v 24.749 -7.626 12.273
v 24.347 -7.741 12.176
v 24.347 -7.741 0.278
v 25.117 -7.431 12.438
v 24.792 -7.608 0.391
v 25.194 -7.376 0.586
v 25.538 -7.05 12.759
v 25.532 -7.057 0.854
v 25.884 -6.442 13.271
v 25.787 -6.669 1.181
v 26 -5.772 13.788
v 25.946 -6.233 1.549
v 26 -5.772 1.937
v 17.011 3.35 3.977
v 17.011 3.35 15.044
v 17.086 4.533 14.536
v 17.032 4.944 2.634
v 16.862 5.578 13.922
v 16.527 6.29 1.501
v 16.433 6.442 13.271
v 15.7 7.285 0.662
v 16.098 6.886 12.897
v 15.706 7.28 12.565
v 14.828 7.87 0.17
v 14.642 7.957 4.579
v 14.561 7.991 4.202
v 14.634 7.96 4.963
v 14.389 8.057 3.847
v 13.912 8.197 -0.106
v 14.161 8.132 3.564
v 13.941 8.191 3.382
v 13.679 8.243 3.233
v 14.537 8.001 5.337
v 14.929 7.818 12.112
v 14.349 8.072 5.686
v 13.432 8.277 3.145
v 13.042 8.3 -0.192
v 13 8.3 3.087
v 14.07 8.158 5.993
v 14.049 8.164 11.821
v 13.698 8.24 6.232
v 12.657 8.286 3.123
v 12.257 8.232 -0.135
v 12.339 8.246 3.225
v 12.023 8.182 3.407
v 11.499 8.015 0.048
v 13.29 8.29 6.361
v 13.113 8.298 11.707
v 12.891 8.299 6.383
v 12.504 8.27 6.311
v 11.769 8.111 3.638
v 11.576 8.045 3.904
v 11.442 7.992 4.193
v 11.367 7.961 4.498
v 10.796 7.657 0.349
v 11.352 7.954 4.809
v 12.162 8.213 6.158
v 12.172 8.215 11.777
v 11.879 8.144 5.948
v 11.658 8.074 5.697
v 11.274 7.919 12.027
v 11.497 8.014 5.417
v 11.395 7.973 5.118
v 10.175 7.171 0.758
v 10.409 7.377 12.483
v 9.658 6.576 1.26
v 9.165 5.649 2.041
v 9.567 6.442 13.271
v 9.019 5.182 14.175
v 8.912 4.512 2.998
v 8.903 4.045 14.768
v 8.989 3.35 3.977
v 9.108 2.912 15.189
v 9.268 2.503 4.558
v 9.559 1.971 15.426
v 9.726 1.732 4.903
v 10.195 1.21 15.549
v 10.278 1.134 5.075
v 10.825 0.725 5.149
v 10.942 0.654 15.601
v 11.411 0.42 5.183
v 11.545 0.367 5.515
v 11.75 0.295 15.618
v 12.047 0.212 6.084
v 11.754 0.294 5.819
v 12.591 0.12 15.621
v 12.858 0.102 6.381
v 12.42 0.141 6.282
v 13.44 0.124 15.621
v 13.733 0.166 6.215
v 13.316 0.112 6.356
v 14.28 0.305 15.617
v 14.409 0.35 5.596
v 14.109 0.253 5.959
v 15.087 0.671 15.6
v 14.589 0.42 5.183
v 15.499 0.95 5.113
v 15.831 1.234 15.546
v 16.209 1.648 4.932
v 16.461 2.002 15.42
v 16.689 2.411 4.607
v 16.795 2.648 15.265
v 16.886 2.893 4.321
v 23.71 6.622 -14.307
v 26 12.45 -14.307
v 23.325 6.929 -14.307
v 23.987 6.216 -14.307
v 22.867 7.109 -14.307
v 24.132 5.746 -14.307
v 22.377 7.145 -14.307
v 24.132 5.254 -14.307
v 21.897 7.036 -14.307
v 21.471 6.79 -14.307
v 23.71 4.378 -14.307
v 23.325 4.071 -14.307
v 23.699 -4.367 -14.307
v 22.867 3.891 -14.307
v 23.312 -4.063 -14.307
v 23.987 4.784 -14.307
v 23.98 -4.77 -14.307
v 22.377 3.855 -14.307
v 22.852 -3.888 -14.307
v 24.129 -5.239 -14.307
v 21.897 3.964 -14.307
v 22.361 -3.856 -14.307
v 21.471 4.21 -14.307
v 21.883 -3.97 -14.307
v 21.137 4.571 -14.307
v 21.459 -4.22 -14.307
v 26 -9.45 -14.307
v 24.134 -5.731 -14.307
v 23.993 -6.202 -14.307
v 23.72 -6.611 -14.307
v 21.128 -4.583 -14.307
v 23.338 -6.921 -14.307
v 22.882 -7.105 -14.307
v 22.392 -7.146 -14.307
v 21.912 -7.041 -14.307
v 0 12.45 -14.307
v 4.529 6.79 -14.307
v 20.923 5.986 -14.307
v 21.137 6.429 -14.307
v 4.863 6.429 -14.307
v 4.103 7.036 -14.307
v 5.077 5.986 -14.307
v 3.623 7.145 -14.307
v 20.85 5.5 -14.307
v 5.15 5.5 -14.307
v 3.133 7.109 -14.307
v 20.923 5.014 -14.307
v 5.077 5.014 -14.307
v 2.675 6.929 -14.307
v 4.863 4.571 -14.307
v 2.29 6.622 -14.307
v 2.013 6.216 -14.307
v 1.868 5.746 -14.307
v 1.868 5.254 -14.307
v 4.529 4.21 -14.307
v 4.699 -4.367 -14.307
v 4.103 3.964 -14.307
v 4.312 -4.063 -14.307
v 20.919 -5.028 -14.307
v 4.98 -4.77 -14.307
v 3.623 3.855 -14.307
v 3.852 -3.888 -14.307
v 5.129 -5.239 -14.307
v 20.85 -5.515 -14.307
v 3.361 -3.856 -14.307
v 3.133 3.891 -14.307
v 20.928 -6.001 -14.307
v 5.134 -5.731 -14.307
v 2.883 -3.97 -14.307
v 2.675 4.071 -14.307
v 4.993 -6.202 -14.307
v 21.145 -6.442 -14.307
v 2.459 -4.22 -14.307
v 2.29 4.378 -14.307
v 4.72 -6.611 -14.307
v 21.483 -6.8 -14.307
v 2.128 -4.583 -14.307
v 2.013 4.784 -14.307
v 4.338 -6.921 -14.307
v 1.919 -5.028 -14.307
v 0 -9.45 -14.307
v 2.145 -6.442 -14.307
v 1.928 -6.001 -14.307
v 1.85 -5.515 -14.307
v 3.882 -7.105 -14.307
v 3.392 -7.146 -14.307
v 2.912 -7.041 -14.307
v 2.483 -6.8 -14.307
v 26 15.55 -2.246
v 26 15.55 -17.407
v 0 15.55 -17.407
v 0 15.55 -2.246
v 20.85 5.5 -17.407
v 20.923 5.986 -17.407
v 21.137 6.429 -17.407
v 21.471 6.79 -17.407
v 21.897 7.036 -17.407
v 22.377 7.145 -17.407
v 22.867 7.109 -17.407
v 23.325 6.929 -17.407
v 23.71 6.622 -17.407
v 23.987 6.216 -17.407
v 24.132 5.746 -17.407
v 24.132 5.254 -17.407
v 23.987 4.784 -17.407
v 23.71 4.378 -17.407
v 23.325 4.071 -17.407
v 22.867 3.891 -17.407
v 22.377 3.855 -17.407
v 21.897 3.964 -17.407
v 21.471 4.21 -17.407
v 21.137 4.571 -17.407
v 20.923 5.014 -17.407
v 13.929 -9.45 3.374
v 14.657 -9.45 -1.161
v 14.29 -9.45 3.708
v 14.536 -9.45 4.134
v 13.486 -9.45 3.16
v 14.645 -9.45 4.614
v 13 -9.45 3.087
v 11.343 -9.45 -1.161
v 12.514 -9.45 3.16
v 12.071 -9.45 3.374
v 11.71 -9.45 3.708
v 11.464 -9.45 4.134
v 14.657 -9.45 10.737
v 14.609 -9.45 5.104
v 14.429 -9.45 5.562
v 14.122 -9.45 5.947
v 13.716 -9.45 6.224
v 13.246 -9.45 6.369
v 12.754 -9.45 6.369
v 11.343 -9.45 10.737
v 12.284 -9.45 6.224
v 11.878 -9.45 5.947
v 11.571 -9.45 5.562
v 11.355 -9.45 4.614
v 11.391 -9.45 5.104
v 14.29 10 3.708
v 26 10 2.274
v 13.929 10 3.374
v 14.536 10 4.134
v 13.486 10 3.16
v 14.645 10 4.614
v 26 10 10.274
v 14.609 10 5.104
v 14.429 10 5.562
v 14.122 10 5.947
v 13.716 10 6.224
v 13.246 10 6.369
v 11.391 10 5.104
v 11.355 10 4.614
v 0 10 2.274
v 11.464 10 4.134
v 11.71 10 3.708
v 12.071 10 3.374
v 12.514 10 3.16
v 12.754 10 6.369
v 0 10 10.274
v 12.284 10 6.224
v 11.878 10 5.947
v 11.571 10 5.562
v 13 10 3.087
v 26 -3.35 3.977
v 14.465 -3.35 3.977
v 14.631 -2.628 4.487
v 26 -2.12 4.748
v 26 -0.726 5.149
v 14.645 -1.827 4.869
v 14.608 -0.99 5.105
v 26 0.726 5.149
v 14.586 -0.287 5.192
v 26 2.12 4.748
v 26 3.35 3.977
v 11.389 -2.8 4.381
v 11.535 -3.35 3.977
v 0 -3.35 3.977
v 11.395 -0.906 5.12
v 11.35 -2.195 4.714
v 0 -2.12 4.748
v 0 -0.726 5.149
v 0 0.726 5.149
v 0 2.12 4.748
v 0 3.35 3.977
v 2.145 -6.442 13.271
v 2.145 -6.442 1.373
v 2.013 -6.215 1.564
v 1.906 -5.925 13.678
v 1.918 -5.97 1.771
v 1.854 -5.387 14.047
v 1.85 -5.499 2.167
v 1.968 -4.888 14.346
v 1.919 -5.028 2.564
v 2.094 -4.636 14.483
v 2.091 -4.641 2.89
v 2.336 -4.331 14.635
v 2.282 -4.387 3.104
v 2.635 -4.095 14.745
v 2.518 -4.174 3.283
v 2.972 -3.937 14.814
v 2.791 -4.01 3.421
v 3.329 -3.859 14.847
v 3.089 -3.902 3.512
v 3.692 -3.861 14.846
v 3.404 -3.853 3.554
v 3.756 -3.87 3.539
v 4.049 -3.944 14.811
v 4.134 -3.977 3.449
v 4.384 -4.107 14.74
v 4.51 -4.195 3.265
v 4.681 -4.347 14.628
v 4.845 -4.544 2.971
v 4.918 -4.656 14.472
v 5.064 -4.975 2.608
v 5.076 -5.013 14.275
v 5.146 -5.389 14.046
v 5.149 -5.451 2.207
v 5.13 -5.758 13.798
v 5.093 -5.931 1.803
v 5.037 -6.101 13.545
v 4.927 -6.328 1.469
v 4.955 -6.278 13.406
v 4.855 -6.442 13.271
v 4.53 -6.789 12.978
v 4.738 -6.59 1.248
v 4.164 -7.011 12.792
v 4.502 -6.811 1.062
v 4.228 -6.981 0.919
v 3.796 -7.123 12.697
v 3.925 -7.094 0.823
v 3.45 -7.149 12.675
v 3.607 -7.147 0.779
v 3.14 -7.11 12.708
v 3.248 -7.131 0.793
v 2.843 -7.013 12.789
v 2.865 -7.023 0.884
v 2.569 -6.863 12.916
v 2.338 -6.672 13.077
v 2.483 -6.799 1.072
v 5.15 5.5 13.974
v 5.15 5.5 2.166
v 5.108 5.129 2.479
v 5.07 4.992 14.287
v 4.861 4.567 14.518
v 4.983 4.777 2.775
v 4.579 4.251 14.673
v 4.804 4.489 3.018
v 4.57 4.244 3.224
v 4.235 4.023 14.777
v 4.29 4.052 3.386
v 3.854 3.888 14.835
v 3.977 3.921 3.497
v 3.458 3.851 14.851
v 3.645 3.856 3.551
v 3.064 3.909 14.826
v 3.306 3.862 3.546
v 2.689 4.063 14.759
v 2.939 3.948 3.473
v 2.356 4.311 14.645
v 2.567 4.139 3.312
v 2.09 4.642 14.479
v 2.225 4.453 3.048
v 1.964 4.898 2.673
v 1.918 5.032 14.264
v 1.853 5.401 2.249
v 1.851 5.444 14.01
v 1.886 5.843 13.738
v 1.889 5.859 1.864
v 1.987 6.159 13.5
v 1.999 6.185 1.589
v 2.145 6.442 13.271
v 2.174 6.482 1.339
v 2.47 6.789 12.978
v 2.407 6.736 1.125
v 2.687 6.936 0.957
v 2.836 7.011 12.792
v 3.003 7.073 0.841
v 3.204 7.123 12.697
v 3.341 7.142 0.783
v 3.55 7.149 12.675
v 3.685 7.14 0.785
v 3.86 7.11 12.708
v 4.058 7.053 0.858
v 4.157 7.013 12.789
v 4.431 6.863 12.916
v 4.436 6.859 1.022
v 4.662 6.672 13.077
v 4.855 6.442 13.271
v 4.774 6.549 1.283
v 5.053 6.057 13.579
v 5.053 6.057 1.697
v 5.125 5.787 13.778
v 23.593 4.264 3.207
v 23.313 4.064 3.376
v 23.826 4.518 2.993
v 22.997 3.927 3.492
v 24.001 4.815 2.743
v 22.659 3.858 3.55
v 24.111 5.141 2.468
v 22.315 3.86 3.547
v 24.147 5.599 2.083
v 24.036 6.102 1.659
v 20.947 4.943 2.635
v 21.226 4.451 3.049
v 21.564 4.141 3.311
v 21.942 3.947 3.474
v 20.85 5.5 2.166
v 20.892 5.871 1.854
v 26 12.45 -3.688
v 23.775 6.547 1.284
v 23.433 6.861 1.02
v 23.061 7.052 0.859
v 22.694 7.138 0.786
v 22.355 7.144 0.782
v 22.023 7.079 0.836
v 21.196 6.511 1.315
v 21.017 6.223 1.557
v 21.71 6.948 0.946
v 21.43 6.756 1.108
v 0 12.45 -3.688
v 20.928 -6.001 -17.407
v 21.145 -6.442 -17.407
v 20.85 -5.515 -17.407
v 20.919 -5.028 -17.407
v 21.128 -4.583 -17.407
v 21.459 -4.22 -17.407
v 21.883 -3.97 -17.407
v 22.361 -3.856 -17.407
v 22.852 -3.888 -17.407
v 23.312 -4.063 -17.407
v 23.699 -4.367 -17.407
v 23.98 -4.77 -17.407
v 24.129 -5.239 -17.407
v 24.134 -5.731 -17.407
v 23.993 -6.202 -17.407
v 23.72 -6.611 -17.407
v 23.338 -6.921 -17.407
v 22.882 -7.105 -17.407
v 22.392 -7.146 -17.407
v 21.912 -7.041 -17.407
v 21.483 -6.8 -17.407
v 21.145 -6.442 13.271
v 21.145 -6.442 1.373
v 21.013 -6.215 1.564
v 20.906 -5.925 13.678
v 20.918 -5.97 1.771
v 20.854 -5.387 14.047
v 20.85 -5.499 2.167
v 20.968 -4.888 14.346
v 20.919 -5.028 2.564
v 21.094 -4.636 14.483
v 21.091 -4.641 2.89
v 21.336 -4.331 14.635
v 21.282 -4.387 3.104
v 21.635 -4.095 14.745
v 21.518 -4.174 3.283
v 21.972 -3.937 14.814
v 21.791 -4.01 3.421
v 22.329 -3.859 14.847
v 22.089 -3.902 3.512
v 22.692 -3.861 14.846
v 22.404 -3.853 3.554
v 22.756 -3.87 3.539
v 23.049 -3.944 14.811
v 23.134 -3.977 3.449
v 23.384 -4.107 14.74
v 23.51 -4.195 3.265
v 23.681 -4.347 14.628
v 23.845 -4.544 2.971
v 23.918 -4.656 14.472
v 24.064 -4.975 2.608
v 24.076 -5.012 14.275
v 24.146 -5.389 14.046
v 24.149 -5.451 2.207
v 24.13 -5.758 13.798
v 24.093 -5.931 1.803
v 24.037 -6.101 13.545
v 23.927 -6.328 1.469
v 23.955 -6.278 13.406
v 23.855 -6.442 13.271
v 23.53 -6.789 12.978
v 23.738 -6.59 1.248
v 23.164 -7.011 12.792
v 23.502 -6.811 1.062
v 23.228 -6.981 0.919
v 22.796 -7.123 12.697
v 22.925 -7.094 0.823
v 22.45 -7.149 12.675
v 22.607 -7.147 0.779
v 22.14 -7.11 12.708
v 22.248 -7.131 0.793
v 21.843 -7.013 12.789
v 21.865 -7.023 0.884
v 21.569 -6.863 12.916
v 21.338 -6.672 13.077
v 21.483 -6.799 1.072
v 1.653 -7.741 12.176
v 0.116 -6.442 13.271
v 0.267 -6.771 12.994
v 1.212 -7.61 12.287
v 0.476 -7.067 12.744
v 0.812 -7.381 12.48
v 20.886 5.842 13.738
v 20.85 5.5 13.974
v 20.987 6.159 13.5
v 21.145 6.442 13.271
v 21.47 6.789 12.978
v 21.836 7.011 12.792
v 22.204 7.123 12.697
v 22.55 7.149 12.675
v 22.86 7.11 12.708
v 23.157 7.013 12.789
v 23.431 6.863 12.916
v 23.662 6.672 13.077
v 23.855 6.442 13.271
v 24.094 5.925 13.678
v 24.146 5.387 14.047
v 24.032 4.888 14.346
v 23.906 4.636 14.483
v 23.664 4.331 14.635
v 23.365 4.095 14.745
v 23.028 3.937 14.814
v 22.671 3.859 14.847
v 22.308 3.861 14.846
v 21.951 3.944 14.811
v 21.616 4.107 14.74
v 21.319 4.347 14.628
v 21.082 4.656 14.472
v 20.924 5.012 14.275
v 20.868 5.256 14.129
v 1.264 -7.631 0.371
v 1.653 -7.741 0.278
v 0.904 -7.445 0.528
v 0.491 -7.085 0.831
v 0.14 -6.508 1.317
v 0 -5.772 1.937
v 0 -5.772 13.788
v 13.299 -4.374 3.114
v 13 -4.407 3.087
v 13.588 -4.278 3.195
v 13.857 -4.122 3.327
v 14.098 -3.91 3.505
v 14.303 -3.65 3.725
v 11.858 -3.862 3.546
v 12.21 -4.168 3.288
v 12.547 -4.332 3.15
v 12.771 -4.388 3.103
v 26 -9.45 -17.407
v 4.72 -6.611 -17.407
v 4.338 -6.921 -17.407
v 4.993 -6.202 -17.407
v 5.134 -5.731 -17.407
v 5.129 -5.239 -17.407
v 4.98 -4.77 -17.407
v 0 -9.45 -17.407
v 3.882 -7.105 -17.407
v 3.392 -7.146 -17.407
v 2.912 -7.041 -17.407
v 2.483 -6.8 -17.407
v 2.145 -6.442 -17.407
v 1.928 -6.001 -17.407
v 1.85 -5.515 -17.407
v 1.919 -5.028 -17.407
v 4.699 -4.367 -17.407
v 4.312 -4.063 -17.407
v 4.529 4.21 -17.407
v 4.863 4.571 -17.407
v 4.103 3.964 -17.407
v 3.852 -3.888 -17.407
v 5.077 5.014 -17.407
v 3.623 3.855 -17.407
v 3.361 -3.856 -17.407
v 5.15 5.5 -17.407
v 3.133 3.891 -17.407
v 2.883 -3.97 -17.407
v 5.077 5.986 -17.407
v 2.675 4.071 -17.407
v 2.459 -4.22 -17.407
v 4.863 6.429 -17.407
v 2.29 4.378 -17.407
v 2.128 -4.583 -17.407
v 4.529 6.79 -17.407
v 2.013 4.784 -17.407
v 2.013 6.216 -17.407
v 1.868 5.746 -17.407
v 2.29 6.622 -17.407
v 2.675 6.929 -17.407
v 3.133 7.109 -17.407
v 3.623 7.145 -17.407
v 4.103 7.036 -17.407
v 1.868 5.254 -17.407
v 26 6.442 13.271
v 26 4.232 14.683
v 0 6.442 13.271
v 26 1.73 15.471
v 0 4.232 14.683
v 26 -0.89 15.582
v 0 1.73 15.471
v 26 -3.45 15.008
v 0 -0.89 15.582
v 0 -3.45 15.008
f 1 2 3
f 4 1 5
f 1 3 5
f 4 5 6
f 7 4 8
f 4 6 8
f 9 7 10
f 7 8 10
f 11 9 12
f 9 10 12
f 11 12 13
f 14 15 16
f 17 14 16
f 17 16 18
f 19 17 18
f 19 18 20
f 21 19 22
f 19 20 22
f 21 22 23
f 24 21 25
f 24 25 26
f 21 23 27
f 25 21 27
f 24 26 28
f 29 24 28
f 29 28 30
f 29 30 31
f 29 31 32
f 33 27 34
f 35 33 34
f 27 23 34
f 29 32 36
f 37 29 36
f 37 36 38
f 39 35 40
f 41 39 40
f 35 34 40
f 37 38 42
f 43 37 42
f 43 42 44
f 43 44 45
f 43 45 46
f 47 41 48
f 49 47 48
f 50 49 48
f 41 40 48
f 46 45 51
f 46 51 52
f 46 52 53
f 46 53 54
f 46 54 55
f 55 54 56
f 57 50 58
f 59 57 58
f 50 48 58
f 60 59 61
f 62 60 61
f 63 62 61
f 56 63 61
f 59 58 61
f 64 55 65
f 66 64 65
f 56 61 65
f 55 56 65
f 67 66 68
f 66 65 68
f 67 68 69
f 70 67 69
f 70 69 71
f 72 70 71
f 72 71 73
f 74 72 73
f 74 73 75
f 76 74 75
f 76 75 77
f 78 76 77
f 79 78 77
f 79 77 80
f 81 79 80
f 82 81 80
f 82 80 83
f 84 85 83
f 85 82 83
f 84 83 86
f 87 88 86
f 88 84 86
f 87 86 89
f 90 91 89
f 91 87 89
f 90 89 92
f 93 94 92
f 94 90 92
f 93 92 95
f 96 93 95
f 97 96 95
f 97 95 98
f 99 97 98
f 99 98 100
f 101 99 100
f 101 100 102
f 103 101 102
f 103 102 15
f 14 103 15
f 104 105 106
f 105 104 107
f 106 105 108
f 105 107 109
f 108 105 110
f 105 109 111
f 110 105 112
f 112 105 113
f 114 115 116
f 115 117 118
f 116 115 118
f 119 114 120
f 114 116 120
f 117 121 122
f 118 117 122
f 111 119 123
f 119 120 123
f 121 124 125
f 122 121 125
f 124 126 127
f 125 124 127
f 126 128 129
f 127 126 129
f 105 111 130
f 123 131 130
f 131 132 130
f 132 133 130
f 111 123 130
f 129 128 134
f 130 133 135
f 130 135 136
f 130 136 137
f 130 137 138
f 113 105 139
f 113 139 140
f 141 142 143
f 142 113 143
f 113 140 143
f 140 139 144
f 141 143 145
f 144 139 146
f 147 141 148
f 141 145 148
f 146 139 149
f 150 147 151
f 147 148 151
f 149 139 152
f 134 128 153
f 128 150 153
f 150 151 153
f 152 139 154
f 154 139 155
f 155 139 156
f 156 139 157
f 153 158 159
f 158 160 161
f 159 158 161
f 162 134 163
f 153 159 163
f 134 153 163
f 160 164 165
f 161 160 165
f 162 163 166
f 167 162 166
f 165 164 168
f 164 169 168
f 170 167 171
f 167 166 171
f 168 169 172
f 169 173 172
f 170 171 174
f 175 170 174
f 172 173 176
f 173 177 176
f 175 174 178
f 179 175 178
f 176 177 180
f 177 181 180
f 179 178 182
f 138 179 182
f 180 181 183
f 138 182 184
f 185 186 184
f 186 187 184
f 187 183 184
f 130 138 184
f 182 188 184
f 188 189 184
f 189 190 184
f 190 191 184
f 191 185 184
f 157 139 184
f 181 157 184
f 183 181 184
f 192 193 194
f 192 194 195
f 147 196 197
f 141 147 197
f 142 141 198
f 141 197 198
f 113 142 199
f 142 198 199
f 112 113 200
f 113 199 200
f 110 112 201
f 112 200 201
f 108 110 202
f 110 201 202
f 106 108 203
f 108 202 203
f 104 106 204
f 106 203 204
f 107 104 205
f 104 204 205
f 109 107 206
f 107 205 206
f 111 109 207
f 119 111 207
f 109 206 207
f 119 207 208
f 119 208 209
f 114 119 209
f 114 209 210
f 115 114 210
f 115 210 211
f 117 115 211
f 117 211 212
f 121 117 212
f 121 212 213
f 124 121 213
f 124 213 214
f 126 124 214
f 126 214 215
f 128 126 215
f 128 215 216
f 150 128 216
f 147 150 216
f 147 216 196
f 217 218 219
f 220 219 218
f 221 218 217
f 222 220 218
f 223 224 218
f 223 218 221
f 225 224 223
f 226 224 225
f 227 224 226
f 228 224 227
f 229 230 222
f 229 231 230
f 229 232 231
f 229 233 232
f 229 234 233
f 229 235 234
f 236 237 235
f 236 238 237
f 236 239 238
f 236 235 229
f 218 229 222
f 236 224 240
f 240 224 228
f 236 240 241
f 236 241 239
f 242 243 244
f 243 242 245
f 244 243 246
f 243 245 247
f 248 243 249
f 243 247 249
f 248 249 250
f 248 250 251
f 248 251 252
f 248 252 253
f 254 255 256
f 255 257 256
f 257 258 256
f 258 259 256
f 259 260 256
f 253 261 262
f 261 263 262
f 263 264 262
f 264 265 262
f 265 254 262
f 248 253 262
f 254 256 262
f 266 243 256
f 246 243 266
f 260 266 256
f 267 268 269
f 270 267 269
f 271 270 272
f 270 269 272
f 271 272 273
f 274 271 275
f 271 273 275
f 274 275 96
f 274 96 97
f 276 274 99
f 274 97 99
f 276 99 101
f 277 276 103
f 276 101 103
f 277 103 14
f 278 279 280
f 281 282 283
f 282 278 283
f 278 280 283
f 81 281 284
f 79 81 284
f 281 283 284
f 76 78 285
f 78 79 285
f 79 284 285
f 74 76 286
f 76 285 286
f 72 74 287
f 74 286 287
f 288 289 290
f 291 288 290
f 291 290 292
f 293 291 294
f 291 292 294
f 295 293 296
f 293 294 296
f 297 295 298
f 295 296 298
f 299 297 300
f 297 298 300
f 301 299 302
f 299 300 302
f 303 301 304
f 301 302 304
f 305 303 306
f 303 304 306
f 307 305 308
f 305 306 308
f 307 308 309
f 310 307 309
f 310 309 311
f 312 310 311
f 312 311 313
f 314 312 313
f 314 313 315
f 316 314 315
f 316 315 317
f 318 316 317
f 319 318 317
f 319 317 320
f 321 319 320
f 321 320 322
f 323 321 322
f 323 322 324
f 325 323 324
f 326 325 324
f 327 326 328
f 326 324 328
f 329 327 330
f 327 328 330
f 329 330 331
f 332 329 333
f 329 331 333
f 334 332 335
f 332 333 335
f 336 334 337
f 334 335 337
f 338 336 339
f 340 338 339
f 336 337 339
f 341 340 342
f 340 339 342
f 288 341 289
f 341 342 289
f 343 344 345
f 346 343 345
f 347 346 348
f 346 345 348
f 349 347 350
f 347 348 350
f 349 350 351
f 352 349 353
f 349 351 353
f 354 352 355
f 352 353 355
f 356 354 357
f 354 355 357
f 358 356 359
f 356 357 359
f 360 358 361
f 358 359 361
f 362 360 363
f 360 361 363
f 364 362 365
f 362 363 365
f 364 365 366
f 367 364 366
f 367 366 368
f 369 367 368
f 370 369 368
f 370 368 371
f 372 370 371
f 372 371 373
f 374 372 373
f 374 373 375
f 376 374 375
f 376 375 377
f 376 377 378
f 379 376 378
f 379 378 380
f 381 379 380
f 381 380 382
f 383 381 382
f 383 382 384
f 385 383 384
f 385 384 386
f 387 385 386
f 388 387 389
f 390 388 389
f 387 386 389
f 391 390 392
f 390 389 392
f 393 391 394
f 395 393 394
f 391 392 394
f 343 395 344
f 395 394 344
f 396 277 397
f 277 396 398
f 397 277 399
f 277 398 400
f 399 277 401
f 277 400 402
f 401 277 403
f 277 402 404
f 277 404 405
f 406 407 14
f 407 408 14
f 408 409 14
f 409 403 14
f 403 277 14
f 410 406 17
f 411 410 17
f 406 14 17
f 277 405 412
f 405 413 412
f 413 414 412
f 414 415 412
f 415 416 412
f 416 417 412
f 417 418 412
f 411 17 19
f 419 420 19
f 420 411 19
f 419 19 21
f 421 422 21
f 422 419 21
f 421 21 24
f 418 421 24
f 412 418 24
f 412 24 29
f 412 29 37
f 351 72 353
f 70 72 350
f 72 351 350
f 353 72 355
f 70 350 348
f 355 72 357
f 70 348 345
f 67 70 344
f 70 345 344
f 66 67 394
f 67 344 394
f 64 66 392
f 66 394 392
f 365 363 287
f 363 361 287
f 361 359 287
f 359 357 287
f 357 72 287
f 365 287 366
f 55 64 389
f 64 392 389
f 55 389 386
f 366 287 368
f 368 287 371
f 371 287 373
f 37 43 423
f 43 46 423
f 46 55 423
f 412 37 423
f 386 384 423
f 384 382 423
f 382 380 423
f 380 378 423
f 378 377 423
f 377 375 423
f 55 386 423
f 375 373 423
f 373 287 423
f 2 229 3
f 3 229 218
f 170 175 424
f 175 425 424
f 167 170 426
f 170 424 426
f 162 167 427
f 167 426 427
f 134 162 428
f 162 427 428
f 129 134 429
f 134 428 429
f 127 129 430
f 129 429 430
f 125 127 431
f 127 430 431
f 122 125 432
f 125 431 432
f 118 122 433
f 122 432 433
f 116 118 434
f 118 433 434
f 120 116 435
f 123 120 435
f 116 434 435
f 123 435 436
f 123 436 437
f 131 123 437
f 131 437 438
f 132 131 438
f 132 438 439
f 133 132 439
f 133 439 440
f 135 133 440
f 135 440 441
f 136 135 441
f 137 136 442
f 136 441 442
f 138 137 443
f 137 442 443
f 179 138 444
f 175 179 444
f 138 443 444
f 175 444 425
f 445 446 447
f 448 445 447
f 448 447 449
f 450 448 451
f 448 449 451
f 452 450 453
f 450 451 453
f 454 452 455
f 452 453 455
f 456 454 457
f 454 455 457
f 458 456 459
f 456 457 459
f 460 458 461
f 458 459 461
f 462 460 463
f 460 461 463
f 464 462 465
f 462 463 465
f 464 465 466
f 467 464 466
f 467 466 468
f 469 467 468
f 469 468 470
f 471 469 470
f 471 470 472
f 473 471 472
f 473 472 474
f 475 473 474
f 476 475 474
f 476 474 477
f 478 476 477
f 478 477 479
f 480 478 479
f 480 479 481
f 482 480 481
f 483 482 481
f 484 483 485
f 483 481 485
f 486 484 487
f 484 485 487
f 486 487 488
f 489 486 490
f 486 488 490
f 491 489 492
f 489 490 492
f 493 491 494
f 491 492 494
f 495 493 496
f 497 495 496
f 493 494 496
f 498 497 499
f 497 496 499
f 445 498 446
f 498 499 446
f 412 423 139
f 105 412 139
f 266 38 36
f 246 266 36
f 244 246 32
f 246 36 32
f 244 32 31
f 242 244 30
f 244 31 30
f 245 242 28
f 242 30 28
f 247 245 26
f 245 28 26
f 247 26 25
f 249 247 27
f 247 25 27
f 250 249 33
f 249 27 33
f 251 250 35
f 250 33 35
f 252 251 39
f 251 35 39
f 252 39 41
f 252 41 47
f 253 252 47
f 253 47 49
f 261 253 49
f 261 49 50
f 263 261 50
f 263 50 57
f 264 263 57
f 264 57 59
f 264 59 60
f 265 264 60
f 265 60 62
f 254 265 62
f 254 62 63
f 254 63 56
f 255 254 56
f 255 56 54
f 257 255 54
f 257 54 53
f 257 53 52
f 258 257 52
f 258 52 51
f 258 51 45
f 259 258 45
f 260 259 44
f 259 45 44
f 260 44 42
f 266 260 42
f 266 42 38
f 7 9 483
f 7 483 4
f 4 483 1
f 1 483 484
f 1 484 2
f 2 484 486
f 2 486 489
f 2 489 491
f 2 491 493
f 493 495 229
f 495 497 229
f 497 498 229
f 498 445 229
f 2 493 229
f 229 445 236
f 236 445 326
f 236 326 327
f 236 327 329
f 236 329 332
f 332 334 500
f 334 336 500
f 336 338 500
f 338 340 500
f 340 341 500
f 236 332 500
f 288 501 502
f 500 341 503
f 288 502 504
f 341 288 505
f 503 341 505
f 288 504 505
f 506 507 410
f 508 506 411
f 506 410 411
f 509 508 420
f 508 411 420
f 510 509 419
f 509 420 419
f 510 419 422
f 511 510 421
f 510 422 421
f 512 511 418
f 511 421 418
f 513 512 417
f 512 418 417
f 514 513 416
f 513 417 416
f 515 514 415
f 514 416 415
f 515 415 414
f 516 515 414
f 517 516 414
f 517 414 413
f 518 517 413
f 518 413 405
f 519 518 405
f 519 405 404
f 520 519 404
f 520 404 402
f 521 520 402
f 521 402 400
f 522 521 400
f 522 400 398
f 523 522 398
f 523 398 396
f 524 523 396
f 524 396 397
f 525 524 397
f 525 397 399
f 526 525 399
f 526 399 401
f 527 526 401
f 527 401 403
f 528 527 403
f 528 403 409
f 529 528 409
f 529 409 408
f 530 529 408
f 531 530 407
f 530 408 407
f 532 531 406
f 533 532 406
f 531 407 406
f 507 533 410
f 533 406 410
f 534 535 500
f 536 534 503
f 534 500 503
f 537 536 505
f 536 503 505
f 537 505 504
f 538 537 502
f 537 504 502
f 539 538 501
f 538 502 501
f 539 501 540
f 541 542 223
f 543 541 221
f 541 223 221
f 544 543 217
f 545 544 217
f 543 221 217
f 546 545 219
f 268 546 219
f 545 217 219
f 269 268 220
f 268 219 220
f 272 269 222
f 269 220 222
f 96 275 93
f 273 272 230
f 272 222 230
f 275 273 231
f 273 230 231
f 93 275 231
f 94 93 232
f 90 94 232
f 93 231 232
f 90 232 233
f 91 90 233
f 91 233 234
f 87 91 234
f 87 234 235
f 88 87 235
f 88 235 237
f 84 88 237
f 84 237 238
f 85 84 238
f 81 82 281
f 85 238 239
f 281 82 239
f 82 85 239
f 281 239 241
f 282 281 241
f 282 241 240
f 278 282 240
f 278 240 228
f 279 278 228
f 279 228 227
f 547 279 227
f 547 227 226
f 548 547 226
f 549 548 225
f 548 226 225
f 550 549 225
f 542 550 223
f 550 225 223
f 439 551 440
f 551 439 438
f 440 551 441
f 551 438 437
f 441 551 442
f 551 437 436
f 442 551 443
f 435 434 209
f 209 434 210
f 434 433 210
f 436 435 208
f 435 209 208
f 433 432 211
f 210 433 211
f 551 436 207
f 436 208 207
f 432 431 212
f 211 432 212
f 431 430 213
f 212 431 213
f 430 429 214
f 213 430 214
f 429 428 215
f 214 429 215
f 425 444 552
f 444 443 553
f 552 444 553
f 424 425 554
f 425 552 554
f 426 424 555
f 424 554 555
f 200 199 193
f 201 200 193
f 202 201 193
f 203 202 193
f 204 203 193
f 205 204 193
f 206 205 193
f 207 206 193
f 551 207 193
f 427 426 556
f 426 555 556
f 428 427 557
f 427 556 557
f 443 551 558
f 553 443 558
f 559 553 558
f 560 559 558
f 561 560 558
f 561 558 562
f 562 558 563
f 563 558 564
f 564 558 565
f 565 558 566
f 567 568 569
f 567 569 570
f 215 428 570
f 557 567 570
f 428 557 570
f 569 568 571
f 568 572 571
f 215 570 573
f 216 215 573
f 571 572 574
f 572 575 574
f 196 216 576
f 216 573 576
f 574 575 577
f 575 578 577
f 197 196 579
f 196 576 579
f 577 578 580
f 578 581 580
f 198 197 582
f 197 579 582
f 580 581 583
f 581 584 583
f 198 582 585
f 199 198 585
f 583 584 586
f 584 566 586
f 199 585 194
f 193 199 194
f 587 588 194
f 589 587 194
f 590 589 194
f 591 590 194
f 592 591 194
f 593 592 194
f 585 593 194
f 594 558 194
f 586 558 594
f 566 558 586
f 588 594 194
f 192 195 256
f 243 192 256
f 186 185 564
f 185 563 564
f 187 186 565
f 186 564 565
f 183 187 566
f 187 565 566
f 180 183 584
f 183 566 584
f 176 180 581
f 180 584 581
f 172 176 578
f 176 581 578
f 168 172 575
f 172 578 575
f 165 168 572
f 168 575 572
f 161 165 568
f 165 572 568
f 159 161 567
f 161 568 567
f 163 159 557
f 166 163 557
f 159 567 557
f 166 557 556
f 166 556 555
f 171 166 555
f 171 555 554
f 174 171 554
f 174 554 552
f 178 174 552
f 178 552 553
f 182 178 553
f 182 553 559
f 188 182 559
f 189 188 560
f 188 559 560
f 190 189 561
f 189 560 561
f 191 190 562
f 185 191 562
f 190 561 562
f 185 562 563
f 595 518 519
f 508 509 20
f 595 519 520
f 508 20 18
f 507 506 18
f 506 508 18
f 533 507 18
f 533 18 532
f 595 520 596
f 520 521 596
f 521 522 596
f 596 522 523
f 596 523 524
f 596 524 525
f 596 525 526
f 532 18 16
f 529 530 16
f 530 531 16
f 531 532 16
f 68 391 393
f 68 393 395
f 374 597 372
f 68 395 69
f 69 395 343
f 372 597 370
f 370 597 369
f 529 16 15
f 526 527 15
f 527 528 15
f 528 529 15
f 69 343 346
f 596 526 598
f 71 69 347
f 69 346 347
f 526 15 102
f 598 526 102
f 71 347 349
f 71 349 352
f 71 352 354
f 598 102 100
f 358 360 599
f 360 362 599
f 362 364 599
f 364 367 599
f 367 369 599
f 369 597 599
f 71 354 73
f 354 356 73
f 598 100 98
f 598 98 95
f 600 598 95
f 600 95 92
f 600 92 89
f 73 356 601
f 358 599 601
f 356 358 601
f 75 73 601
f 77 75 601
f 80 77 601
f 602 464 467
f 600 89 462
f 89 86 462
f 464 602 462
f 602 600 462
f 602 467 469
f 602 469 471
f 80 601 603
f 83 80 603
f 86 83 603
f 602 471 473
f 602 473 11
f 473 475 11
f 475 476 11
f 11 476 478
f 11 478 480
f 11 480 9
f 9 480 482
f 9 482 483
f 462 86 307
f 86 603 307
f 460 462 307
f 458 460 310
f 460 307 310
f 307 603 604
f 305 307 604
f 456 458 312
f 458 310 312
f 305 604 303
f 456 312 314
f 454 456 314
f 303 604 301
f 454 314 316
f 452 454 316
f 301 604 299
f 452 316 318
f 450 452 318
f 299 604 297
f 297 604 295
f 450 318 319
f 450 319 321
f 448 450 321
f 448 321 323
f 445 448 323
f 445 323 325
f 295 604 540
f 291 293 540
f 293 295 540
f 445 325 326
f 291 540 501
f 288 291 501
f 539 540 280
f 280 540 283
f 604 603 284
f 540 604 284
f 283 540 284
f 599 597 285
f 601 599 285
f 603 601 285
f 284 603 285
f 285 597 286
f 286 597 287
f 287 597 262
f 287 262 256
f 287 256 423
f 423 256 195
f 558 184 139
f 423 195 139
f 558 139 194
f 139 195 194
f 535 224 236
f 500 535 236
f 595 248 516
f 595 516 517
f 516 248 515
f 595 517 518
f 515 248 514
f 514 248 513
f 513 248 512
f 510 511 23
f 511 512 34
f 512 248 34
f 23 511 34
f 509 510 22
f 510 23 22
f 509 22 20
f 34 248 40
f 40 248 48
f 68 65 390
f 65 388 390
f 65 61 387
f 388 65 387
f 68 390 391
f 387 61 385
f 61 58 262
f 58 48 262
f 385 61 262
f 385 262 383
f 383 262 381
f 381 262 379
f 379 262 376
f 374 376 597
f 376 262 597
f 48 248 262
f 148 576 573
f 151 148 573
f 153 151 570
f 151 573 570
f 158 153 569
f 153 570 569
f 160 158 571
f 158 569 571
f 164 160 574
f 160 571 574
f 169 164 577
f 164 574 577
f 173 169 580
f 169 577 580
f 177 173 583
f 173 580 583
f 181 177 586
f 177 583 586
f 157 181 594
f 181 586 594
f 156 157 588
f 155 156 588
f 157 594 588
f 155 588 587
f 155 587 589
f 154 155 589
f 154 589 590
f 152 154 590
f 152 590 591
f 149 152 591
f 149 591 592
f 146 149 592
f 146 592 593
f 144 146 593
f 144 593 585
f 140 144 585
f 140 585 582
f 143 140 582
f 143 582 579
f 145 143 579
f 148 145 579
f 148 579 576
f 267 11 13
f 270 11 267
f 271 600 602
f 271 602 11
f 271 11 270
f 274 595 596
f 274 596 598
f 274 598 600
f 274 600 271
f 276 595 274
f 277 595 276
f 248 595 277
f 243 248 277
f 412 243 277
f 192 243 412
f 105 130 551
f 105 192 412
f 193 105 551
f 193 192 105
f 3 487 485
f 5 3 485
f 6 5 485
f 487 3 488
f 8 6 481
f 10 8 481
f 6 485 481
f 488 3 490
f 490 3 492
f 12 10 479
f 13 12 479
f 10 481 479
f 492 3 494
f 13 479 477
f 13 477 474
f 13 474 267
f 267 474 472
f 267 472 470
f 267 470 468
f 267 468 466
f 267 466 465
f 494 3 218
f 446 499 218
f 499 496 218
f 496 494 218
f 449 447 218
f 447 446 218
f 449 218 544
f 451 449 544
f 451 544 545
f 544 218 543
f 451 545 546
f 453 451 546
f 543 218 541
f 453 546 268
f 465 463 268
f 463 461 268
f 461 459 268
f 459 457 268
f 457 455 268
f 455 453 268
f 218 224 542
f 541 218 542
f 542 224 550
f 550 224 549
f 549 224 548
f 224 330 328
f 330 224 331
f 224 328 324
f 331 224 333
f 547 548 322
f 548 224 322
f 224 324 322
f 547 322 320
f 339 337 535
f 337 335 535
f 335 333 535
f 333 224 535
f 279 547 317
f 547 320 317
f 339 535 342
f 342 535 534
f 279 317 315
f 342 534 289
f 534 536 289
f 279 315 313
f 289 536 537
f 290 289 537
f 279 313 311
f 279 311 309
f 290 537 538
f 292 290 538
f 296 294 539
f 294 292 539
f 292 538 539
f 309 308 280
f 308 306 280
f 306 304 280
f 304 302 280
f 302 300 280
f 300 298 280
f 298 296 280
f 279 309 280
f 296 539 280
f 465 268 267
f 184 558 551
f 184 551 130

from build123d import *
from OCP.BRepFilletAPI import BRepFilletAPI_MakeChamfer

# Parameters (mm, degrees)
EXTRUDE_1_DEPTH     = 26
SKETCH_2_R          = 1.65
CUT_EXTRUDE_1_DEPTH = 45.819078563
SKETCH_3_W          = 28.1444964
SKETCH_3_H          = 6.1
CUT_EXTRUDE_2_DEPTH = 35.940261345
CUT_EXTRUDE_4_REACH = 46.819
SKETCH_5_R          = 4.1
SKETCH_6_R          = 1.65
CUT_EXTRUDE_5_DEPTH = 41.050210522
CHAMFER_1_SIZE      = 2
CHAMFER_1_SIZE2     = 11.342563639
FILLET_1_R          = 2


with BuildPart() as part:
    # 草图1 → 凸台-拉伸1 (new body)
    with BuildSketch(Plane(origin=(0, 0, 0), x_dir=(0, 0, -1), z_dir=(1, 0, 0))):
        with BuildLine():
            Line((17.407451211, 15.55), (2.245544981, 15.55))
            Line((2.245544981, 15.55), (-2.273793452, 10))
            Line((-2.273793452, 10), (-10.273793452, 10))
            Line((-10.273793452, 10), (-13.270509165, 6.44212097))
            ThreePointArc((-13.270509165, 6.44212097), (-15.622040206, 0), (-13.270509165, -6.44212097))
            Line((-13.270509165, -6.44212097), (-10.273793452, -10))
            Line((-10.273793452, -10), (-2.273793452, -10))
            Line((-2.273793452, -10), (2.245544981, -15.55))
            Line((2.245544981, -15.55), (17.407451211, -15.55))
            Line((17.407451211, -15.55), (17.407451211, 15.55))
        make_face()
        with BuildLine():
            Line((3.687588487, 12.45), (14.307451211, 12.45))
            Line((14.307451211, 12.45), (14.307451211, -12.45))
            Line((14.307451211, -12.45), (3.687588487, -12.45))
            Line((3.687588487, -12.45), (-3.977203858, -3.349902904))
            ThreePointArc((-3.977203858, -3.349902904), (-5.2, 0), (-3.977203858, 3.349902904))
            Line((-3.977203858, 3.349902904), (3.687588487, 12.45))
        make_face(mode=Mode.SUBTRACT)
    extrude(amount=EXTRUDE_1_DEPTH)

    # 草图2 → 切除-拉伸1 (cut, through all)
    with BuildSketch(Plane(origin=(0, 0, -17.407451211), x_dir=(-1, 0, 0), z_dir=(0, 0, -1))):
        with Locations((-22.5, 5.5)):
            Circle(SKETCH_2_R)
        with Locations(Location((-22.5, -5.5, 0), (0, 0, 325.181239638))):
            Circle(SKETCH_2_R)
        with Locations(Location((-3.5, -5.5, 0), (0, 0, 325.181239638))):
            Circle(SKETCH_2_R)
        with Locations(Location((-3.5, 5.5, 0), (0, 0, 180))):
            Circle(SKETCH_2_R)
    extrude(amount=-CUT_EXTRUDE_1_DEPTH, mode=Mode.SUBTRACT)

    # 草图3 → 切除-拉伸2 (cut, through all)
    with BuildSketch(Plane.ZY):
        with Locations((-3.335203011, -12.5)):
            Rectangle(SKETCH_3_W, SKETCH_3_H)
    extrude(amount=-CUT_EXTRUDE_2_DEPTH, mode=Mode.SUBTRACT)

    # 草图5 → 切除-拉伸4 (cut, up to next)
    with BuildSketch(Plane.XY.offset(15.622040206), mode=Mode.PRIVATE) as cut_extrude_4_sk1:
        with Locations(Location((13, 4.2, 0), (0, 0, 348.033440949))):
            Circle(SKETCH_5_R)
    cut_extrude_4_tool1 = extrude(cut_extrude_4_sk1.sketch, amount=-CUT_EXTRUDE_4_REACH, mode=Mode.PRIVATE) & part.part
    add(cut_extrude_4_tool1.solids().sort_by_distance((13, 4.2, 15.62204))[0], mode=Mode.SUBTRACT)

    # 草图6 → 切除-拉伸5 (cut, through all)
    with BuildSketch(Plane.XZ.offset(9.45)):
        with Locations(Location((13, 4.737045189, 0), (0, 0, 270))):
            Circle(SKETCH_6_R)
    extrude(amount=-CUT_EXTRUDE_5_DEPTH, mode=Mode.SUBTRACT)

    # 倒角1: one chamfer whose edges measure the first distance from different faces: ONE call of the kernel's chamfer builder (chamfer() names one face for all edges)
    chamfer_1_edges_1 = [part.edges().sort_by_distance(p)[0] for p in [
        (0, -9.45, 4.78814218),
    ]]
    chamfer_1_side_1 = [part.faces().sort_by_distance(p)[0] for p in [
        (0, -9.035760057, -15.857451211),
    ]]
    chamfer_1_edges_2 = [part.edges().sort_by_distance(p)[0] for p in [
        (26, -9.45, 4.78814218),
    ]]
    chamfer_1_side_2 = [part.faces().sort_by_distance(p)[0] for p in [
        (26, -9.035760057, -15.857451211),
    ]]
    chamfer_1 = BRepFilletAPI_MakeChamfer(part.part.solid().wrapped)
    for e in chamfer_1_edges_1:
        chamfer_1.Add(CHAMFER_1_SIZE, CHAMFER_1_SIZE2, e.wrapped, chamfer_1_side_1[0].wrapped)  # the first distance lies on this face
    for e in chamfer_1_edges_2:
        chamfer_1.Add(CHAMFER_1_SIZE, CHAMFER_1_SIZE2, e.wrapped, chamfer_1_side_2[0].wrapped)  # the first distance lies on this face
    add(Compound.cast(chamfer_1.Shape()), mode=Mode.REPLACE)

    # 圆角1
    # the kernel refuses this fillet: 2 mm, written as the material it takes off along each edge
    with BuildSketch(Plane(origin=(26, -7.45, -3.671707212), x_dir=(-0.9848077530122086, -0.17364817766692747, 0), z_dir=(0, 0, 1))) as fillet_1_piece_1:
        with BuildLine():
            CenterArc((FILLET_1_R * 0.839099631177, -FILLET_1_R), FILLET_1_R, 90, 80)
            Line((-FILLET_1_R * 0.145708121835, -FILLET_1_R * 0.826351822333), (0, 0))
            Line((0, 0), (FILLET_1_R * 0.839099631177, 0))
        make_face()
    extrude(amount=20.288802329, mode=Mode.SUBTRACT)
    with BuildSketch(Plane(origin=(0, -7.45, 16.617095117), x_dir=(0, 1, 0), z_dir=(0, 0, -1))) as fillet_1_piece_2:
        with BuildLine():
            CenterArc((FILLET_1_R * 0.839099631177, FILLET_1_R), FILLET_1_R, 190, 80)
            Line((-FILLET_1_R * 0.145708121835, FILLET_1_R * 0.826351822333), (0, 0))
            Line((0, 0), (FILLET_1_R * 0.839099631177, 0))
        make_face()
    extrude(amount=20.288802329, mode=Mode.SUBTRACT)


solid = part.part
